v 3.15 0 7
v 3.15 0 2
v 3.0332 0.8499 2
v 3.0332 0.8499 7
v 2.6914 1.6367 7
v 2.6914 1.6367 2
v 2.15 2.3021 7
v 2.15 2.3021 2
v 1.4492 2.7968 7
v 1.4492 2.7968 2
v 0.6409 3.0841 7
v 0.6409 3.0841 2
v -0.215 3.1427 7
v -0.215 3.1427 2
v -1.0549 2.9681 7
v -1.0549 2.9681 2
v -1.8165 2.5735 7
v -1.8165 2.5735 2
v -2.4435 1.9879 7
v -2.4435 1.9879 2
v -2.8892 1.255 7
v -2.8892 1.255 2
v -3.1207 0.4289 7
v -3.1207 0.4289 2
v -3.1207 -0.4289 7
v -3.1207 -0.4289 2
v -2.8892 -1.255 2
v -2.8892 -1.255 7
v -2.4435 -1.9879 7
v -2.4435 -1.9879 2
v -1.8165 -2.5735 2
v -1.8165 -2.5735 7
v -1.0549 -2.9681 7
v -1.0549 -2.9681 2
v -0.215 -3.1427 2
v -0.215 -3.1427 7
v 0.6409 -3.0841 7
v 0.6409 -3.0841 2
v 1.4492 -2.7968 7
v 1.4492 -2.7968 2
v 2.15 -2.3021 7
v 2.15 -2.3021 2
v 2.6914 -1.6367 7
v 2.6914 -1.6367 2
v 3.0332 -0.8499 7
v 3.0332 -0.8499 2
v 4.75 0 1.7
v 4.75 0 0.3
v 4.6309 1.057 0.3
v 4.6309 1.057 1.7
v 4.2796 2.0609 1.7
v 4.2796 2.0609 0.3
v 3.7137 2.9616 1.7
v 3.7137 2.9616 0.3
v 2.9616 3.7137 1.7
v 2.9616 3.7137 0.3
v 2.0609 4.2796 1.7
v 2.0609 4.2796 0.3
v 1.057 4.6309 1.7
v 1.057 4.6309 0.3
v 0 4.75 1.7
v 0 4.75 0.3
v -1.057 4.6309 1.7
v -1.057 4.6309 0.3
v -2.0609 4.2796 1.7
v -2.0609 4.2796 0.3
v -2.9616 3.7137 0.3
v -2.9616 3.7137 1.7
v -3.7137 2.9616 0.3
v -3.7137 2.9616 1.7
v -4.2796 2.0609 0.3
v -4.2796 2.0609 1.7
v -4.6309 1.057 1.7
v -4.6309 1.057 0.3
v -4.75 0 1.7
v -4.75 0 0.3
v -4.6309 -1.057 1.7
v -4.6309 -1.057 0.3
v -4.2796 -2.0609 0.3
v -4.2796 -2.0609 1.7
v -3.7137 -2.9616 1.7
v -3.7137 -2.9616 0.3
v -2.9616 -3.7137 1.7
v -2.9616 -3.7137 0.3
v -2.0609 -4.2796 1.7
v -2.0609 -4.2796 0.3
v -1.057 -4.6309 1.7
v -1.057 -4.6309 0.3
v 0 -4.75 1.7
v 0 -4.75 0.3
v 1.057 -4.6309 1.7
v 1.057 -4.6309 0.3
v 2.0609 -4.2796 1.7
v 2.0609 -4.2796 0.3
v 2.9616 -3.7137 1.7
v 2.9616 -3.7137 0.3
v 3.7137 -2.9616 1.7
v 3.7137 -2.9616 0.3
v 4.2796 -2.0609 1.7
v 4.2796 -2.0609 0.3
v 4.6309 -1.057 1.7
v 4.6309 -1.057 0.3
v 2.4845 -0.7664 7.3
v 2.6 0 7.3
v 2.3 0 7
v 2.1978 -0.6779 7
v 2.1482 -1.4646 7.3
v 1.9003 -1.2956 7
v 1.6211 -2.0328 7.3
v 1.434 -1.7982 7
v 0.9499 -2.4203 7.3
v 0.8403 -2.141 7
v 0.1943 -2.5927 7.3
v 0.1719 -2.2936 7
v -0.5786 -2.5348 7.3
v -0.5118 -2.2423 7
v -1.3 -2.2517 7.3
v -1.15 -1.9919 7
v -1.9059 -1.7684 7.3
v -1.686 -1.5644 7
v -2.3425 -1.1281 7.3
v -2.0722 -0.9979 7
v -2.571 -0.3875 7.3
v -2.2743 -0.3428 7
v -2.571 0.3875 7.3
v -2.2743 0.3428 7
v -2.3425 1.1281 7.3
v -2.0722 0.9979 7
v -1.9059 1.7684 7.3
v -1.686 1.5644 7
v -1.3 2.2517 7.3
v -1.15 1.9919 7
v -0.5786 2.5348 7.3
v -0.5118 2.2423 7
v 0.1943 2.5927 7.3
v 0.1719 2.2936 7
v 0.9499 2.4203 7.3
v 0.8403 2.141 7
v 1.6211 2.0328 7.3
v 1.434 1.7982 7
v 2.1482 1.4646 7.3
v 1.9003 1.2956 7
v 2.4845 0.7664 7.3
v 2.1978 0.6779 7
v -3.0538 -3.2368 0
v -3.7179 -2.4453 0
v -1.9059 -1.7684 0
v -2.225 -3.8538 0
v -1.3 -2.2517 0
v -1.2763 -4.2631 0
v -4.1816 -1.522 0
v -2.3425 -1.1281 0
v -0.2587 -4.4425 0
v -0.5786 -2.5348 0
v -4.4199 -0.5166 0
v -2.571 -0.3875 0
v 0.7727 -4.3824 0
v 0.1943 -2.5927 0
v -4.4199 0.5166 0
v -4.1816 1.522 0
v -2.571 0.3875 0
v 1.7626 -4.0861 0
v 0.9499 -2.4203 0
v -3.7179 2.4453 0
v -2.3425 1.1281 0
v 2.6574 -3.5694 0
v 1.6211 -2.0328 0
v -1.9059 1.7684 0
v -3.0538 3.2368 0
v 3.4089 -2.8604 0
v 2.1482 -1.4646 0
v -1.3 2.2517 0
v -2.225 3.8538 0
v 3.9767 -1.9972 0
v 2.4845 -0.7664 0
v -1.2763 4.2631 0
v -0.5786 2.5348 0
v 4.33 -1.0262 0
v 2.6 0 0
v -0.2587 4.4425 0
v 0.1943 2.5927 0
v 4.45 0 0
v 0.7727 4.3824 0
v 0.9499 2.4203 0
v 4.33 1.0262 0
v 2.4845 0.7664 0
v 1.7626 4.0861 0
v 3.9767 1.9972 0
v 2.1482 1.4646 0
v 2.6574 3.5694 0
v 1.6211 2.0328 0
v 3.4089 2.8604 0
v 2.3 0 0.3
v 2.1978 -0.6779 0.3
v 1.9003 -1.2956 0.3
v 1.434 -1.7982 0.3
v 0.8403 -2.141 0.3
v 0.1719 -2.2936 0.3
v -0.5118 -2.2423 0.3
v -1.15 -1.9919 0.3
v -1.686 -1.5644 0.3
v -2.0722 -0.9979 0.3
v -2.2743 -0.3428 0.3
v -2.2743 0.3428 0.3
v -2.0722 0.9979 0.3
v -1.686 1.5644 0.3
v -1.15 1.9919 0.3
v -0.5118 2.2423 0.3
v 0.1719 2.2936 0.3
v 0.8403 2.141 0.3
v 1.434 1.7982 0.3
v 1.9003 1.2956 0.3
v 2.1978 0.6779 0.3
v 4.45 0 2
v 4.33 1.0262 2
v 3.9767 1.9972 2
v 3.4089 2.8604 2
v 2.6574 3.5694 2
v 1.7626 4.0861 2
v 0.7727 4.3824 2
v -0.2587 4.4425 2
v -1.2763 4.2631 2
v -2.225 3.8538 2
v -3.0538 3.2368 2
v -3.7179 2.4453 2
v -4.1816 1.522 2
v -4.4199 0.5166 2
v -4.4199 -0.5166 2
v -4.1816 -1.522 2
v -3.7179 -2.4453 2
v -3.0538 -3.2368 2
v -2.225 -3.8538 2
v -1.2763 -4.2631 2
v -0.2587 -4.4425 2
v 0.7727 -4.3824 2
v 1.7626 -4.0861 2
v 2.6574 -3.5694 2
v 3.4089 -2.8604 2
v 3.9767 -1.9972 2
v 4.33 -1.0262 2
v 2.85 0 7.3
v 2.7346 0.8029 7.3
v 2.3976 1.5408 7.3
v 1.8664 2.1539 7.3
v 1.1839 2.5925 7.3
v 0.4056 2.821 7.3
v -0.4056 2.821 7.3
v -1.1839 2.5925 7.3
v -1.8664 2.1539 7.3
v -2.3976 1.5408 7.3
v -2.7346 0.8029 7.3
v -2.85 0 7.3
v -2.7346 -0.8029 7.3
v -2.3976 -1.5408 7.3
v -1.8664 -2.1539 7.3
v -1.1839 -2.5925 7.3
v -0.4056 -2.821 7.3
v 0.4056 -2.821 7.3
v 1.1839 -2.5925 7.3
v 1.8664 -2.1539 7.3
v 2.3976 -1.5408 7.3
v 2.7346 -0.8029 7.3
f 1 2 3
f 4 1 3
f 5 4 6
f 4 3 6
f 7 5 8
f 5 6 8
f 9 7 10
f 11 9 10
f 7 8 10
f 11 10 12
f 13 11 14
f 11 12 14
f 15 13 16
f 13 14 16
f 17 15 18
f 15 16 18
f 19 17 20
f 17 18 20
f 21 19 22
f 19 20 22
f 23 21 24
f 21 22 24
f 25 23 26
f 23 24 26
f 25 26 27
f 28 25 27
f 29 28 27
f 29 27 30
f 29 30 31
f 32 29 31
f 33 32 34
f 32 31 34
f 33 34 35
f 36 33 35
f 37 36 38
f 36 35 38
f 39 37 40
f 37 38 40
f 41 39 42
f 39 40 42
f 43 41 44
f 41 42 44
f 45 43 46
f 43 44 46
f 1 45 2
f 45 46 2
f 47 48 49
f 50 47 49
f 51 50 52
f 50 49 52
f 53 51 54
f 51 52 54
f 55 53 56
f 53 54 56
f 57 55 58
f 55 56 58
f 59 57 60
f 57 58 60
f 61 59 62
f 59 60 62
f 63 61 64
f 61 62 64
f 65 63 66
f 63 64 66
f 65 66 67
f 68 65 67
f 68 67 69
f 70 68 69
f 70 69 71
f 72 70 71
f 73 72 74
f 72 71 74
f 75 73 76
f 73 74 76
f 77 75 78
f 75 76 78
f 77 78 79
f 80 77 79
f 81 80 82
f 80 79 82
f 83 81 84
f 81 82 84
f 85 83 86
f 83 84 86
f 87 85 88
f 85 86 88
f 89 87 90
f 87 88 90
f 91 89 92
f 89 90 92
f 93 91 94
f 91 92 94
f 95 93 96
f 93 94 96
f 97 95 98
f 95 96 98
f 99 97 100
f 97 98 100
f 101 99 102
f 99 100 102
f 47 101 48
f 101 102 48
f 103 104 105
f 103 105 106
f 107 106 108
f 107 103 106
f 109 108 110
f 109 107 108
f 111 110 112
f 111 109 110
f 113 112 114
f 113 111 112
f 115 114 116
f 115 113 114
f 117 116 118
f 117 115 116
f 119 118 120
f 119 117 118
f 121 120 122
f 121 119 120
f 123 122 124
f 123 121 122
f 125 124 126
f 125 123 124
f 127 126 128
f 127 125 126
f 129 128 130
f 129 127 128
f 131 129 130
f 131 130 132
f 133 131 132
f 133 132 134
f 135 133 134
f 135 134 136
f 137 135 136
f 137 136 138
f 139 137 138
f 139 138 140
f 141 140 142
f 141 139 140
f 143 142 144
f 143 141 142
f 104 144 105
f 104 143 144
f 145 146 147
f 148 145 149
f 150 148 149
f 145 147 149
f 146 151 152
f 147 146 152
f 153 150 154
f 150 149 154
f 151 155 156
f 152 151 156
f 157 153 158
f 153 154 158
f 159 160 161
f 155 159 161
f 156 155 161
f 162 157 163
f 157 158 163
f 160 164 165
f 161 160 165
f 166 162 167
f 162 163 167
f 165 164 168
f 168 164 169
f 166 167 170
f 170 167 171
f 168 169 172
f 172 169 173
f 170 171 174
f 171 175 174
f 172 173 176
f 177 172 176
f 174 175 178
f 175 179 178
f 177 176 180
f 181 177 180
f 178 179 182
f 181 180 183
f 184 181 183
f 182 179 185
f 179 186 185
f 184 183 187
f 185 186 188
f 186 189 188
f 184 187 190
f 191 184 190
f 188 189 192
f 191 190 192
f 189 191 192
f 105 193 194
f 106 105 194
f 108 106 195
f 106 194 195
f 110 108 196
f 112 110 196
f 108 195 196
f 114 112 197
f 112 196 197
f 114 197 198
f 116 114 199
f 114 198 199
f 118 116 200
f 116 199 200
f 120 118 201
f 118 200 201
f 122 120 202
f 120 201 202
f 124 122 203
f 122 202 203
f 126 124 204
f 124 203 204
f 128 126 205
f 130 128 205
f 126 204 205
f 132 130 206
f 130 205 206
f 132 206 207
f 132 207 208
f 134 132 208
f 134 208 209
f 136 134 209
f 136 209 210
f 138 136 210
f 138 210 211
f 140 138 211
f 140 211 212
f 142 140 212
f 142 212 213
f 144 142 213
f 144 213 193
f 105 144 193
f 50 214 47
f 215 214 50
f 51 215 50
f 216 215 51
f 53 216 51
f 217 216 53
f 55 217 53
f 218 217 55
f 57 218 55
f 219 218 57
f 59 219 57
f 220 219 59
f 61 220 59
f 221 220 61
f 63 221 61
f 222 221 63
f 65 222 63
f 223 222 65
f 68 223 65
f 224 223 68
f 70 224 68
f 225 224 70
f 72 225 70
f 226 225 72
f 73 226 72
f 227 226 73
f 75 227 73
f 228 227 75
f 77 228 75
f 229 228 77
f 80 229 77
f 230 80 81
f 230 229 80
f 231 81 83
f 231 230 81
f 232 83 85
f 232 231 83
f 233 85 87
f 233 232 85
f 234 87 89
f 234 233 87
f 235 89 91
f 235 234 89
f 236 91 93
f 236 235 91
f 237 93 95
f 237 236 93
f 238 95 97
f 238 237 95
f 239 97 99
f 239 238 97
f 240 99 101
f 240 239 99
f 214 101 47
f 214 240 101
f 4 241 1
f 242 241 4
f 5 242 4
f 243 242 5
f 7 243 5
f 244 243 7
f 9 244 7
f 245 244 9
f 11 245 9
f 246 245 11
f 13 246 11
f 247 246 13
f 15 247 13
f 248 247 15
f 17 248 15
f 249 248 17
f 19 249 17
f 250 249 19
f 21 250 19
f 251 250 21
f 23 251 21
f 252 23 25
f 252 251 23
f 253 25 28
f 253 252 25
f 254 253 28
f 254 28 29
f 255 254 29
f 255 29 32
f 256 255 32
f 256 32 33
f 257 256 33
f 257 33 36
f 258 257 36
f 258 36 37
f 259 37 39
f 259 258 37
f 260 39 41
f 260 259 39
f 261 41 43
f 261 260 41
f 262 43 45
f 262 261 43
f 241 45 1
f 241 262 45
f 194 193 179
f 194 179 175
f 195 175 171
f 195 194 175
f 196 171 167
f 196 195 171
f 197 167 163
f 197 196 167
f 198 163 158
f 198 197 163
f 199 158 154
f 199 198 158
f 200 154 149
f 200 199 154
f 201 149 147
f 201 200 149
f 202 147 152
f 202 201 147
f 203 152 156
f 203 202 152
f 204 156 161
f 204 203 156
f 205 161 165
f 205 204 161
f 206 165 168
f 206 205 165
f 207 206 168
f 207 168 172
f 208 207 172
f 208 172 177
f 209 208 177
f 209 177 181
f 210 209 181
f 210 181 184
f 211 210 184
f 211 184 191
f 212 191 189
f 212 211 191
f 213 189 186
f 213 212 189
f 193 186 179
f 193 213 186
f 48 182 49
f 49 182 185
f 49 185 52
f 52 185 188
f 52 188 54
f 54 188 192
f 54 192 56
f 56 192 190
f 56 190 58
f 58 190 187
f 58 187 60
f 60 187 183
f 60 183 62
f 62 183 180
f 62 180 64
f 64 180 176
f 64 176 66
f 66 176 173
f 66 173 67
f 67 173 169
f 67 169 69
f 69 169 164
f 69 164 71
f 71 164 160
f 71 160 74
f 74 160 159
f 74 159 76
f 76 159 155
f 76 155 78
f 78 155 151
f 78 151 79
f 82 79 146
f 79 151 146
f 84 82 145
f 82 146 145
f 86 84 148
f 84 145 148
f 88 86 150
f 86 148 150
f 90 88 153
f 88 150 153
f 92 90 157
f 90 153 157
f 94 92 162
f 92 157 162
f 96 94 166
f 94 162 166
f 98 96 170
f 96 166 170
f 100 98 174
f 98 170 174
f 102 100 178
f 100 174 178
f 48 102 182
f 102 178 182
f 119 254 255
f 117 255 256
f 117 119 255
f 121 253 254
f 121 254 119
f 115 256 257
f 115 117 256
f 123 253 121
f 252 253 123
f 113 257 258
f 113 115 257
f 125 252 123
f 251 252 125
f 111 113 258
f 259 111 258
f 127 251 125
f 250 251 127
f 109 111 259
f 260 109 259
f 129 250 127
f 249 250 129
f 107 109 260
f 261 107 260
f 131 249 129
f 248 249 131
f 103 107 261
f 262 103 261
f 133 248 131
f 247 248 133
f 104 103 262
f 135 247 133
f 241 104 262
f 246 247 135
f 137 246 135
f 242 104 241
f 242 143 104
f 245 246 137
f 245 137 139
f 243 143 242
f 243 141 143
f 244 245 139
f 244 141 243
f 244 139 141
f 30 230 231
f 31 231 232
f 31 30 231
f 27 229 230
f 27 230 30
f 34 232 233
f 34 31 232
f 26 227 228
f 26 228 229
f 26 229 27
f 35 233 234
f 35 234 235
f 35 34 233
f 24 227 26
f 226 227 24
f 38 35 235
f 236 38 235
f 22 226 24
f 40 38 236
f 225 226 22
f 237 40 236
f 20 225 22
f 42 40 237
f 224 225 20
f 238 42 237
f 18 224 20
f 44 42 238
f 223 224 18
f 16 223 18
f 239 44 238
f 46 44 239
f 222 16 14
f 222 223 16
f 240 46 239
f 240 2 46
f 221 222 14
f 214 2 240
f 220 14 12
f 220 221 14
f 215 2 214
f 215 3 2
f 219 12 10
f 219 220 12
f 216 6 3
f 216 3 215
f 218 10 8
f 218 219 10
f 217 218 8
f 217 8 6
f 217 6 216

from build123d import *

# Parameters (mm, degrees)
F0_R     = 4.75
F1_DEPTH = 2
F2_R     = 3.15
F3_DEPTH = 5.3
F4_R     = 2.3
F5_DEPTH = 7.301
F6_SIZE  = 0.3


with BuildPart() as f1:
    # F0 (on Top) → F1 (new body)
    with BuildSketch(Plane.XY):
        Circle(F0_R)
    extrude(amount=F1_DEPTH)

    # F2 (on face) → F3 (join)
    with BuildSketch(Plane.XY.offset(2)):
        Circle(F2_R)
    extrude(amount=F3_DEPTH)

    # F4 (on face) → F5 (cut, through all)
    with BuildSketch(Plane(origin=(0, 0, 0), x_dir=(1, 0, 0), z_dir=(0, 0, -1))):
        Circle(F4_R)
    extrude(amount=-F5_DEPTH, mode=Mode.SUBTRACT)

    # F6
    f6_edges = [f1.edges().sort_by_distance(p)[0] for p in [
        (-4.75, 0, 0),
        (-2.3, 0, 0),
        (-2.3, 0, 7.3),
        (-3.15, 0, 7.3),
        (-4.75, 0, 2),
    ]]
    chamfer(f6_edges, length=F6_SIZE)


solid = f1.part
